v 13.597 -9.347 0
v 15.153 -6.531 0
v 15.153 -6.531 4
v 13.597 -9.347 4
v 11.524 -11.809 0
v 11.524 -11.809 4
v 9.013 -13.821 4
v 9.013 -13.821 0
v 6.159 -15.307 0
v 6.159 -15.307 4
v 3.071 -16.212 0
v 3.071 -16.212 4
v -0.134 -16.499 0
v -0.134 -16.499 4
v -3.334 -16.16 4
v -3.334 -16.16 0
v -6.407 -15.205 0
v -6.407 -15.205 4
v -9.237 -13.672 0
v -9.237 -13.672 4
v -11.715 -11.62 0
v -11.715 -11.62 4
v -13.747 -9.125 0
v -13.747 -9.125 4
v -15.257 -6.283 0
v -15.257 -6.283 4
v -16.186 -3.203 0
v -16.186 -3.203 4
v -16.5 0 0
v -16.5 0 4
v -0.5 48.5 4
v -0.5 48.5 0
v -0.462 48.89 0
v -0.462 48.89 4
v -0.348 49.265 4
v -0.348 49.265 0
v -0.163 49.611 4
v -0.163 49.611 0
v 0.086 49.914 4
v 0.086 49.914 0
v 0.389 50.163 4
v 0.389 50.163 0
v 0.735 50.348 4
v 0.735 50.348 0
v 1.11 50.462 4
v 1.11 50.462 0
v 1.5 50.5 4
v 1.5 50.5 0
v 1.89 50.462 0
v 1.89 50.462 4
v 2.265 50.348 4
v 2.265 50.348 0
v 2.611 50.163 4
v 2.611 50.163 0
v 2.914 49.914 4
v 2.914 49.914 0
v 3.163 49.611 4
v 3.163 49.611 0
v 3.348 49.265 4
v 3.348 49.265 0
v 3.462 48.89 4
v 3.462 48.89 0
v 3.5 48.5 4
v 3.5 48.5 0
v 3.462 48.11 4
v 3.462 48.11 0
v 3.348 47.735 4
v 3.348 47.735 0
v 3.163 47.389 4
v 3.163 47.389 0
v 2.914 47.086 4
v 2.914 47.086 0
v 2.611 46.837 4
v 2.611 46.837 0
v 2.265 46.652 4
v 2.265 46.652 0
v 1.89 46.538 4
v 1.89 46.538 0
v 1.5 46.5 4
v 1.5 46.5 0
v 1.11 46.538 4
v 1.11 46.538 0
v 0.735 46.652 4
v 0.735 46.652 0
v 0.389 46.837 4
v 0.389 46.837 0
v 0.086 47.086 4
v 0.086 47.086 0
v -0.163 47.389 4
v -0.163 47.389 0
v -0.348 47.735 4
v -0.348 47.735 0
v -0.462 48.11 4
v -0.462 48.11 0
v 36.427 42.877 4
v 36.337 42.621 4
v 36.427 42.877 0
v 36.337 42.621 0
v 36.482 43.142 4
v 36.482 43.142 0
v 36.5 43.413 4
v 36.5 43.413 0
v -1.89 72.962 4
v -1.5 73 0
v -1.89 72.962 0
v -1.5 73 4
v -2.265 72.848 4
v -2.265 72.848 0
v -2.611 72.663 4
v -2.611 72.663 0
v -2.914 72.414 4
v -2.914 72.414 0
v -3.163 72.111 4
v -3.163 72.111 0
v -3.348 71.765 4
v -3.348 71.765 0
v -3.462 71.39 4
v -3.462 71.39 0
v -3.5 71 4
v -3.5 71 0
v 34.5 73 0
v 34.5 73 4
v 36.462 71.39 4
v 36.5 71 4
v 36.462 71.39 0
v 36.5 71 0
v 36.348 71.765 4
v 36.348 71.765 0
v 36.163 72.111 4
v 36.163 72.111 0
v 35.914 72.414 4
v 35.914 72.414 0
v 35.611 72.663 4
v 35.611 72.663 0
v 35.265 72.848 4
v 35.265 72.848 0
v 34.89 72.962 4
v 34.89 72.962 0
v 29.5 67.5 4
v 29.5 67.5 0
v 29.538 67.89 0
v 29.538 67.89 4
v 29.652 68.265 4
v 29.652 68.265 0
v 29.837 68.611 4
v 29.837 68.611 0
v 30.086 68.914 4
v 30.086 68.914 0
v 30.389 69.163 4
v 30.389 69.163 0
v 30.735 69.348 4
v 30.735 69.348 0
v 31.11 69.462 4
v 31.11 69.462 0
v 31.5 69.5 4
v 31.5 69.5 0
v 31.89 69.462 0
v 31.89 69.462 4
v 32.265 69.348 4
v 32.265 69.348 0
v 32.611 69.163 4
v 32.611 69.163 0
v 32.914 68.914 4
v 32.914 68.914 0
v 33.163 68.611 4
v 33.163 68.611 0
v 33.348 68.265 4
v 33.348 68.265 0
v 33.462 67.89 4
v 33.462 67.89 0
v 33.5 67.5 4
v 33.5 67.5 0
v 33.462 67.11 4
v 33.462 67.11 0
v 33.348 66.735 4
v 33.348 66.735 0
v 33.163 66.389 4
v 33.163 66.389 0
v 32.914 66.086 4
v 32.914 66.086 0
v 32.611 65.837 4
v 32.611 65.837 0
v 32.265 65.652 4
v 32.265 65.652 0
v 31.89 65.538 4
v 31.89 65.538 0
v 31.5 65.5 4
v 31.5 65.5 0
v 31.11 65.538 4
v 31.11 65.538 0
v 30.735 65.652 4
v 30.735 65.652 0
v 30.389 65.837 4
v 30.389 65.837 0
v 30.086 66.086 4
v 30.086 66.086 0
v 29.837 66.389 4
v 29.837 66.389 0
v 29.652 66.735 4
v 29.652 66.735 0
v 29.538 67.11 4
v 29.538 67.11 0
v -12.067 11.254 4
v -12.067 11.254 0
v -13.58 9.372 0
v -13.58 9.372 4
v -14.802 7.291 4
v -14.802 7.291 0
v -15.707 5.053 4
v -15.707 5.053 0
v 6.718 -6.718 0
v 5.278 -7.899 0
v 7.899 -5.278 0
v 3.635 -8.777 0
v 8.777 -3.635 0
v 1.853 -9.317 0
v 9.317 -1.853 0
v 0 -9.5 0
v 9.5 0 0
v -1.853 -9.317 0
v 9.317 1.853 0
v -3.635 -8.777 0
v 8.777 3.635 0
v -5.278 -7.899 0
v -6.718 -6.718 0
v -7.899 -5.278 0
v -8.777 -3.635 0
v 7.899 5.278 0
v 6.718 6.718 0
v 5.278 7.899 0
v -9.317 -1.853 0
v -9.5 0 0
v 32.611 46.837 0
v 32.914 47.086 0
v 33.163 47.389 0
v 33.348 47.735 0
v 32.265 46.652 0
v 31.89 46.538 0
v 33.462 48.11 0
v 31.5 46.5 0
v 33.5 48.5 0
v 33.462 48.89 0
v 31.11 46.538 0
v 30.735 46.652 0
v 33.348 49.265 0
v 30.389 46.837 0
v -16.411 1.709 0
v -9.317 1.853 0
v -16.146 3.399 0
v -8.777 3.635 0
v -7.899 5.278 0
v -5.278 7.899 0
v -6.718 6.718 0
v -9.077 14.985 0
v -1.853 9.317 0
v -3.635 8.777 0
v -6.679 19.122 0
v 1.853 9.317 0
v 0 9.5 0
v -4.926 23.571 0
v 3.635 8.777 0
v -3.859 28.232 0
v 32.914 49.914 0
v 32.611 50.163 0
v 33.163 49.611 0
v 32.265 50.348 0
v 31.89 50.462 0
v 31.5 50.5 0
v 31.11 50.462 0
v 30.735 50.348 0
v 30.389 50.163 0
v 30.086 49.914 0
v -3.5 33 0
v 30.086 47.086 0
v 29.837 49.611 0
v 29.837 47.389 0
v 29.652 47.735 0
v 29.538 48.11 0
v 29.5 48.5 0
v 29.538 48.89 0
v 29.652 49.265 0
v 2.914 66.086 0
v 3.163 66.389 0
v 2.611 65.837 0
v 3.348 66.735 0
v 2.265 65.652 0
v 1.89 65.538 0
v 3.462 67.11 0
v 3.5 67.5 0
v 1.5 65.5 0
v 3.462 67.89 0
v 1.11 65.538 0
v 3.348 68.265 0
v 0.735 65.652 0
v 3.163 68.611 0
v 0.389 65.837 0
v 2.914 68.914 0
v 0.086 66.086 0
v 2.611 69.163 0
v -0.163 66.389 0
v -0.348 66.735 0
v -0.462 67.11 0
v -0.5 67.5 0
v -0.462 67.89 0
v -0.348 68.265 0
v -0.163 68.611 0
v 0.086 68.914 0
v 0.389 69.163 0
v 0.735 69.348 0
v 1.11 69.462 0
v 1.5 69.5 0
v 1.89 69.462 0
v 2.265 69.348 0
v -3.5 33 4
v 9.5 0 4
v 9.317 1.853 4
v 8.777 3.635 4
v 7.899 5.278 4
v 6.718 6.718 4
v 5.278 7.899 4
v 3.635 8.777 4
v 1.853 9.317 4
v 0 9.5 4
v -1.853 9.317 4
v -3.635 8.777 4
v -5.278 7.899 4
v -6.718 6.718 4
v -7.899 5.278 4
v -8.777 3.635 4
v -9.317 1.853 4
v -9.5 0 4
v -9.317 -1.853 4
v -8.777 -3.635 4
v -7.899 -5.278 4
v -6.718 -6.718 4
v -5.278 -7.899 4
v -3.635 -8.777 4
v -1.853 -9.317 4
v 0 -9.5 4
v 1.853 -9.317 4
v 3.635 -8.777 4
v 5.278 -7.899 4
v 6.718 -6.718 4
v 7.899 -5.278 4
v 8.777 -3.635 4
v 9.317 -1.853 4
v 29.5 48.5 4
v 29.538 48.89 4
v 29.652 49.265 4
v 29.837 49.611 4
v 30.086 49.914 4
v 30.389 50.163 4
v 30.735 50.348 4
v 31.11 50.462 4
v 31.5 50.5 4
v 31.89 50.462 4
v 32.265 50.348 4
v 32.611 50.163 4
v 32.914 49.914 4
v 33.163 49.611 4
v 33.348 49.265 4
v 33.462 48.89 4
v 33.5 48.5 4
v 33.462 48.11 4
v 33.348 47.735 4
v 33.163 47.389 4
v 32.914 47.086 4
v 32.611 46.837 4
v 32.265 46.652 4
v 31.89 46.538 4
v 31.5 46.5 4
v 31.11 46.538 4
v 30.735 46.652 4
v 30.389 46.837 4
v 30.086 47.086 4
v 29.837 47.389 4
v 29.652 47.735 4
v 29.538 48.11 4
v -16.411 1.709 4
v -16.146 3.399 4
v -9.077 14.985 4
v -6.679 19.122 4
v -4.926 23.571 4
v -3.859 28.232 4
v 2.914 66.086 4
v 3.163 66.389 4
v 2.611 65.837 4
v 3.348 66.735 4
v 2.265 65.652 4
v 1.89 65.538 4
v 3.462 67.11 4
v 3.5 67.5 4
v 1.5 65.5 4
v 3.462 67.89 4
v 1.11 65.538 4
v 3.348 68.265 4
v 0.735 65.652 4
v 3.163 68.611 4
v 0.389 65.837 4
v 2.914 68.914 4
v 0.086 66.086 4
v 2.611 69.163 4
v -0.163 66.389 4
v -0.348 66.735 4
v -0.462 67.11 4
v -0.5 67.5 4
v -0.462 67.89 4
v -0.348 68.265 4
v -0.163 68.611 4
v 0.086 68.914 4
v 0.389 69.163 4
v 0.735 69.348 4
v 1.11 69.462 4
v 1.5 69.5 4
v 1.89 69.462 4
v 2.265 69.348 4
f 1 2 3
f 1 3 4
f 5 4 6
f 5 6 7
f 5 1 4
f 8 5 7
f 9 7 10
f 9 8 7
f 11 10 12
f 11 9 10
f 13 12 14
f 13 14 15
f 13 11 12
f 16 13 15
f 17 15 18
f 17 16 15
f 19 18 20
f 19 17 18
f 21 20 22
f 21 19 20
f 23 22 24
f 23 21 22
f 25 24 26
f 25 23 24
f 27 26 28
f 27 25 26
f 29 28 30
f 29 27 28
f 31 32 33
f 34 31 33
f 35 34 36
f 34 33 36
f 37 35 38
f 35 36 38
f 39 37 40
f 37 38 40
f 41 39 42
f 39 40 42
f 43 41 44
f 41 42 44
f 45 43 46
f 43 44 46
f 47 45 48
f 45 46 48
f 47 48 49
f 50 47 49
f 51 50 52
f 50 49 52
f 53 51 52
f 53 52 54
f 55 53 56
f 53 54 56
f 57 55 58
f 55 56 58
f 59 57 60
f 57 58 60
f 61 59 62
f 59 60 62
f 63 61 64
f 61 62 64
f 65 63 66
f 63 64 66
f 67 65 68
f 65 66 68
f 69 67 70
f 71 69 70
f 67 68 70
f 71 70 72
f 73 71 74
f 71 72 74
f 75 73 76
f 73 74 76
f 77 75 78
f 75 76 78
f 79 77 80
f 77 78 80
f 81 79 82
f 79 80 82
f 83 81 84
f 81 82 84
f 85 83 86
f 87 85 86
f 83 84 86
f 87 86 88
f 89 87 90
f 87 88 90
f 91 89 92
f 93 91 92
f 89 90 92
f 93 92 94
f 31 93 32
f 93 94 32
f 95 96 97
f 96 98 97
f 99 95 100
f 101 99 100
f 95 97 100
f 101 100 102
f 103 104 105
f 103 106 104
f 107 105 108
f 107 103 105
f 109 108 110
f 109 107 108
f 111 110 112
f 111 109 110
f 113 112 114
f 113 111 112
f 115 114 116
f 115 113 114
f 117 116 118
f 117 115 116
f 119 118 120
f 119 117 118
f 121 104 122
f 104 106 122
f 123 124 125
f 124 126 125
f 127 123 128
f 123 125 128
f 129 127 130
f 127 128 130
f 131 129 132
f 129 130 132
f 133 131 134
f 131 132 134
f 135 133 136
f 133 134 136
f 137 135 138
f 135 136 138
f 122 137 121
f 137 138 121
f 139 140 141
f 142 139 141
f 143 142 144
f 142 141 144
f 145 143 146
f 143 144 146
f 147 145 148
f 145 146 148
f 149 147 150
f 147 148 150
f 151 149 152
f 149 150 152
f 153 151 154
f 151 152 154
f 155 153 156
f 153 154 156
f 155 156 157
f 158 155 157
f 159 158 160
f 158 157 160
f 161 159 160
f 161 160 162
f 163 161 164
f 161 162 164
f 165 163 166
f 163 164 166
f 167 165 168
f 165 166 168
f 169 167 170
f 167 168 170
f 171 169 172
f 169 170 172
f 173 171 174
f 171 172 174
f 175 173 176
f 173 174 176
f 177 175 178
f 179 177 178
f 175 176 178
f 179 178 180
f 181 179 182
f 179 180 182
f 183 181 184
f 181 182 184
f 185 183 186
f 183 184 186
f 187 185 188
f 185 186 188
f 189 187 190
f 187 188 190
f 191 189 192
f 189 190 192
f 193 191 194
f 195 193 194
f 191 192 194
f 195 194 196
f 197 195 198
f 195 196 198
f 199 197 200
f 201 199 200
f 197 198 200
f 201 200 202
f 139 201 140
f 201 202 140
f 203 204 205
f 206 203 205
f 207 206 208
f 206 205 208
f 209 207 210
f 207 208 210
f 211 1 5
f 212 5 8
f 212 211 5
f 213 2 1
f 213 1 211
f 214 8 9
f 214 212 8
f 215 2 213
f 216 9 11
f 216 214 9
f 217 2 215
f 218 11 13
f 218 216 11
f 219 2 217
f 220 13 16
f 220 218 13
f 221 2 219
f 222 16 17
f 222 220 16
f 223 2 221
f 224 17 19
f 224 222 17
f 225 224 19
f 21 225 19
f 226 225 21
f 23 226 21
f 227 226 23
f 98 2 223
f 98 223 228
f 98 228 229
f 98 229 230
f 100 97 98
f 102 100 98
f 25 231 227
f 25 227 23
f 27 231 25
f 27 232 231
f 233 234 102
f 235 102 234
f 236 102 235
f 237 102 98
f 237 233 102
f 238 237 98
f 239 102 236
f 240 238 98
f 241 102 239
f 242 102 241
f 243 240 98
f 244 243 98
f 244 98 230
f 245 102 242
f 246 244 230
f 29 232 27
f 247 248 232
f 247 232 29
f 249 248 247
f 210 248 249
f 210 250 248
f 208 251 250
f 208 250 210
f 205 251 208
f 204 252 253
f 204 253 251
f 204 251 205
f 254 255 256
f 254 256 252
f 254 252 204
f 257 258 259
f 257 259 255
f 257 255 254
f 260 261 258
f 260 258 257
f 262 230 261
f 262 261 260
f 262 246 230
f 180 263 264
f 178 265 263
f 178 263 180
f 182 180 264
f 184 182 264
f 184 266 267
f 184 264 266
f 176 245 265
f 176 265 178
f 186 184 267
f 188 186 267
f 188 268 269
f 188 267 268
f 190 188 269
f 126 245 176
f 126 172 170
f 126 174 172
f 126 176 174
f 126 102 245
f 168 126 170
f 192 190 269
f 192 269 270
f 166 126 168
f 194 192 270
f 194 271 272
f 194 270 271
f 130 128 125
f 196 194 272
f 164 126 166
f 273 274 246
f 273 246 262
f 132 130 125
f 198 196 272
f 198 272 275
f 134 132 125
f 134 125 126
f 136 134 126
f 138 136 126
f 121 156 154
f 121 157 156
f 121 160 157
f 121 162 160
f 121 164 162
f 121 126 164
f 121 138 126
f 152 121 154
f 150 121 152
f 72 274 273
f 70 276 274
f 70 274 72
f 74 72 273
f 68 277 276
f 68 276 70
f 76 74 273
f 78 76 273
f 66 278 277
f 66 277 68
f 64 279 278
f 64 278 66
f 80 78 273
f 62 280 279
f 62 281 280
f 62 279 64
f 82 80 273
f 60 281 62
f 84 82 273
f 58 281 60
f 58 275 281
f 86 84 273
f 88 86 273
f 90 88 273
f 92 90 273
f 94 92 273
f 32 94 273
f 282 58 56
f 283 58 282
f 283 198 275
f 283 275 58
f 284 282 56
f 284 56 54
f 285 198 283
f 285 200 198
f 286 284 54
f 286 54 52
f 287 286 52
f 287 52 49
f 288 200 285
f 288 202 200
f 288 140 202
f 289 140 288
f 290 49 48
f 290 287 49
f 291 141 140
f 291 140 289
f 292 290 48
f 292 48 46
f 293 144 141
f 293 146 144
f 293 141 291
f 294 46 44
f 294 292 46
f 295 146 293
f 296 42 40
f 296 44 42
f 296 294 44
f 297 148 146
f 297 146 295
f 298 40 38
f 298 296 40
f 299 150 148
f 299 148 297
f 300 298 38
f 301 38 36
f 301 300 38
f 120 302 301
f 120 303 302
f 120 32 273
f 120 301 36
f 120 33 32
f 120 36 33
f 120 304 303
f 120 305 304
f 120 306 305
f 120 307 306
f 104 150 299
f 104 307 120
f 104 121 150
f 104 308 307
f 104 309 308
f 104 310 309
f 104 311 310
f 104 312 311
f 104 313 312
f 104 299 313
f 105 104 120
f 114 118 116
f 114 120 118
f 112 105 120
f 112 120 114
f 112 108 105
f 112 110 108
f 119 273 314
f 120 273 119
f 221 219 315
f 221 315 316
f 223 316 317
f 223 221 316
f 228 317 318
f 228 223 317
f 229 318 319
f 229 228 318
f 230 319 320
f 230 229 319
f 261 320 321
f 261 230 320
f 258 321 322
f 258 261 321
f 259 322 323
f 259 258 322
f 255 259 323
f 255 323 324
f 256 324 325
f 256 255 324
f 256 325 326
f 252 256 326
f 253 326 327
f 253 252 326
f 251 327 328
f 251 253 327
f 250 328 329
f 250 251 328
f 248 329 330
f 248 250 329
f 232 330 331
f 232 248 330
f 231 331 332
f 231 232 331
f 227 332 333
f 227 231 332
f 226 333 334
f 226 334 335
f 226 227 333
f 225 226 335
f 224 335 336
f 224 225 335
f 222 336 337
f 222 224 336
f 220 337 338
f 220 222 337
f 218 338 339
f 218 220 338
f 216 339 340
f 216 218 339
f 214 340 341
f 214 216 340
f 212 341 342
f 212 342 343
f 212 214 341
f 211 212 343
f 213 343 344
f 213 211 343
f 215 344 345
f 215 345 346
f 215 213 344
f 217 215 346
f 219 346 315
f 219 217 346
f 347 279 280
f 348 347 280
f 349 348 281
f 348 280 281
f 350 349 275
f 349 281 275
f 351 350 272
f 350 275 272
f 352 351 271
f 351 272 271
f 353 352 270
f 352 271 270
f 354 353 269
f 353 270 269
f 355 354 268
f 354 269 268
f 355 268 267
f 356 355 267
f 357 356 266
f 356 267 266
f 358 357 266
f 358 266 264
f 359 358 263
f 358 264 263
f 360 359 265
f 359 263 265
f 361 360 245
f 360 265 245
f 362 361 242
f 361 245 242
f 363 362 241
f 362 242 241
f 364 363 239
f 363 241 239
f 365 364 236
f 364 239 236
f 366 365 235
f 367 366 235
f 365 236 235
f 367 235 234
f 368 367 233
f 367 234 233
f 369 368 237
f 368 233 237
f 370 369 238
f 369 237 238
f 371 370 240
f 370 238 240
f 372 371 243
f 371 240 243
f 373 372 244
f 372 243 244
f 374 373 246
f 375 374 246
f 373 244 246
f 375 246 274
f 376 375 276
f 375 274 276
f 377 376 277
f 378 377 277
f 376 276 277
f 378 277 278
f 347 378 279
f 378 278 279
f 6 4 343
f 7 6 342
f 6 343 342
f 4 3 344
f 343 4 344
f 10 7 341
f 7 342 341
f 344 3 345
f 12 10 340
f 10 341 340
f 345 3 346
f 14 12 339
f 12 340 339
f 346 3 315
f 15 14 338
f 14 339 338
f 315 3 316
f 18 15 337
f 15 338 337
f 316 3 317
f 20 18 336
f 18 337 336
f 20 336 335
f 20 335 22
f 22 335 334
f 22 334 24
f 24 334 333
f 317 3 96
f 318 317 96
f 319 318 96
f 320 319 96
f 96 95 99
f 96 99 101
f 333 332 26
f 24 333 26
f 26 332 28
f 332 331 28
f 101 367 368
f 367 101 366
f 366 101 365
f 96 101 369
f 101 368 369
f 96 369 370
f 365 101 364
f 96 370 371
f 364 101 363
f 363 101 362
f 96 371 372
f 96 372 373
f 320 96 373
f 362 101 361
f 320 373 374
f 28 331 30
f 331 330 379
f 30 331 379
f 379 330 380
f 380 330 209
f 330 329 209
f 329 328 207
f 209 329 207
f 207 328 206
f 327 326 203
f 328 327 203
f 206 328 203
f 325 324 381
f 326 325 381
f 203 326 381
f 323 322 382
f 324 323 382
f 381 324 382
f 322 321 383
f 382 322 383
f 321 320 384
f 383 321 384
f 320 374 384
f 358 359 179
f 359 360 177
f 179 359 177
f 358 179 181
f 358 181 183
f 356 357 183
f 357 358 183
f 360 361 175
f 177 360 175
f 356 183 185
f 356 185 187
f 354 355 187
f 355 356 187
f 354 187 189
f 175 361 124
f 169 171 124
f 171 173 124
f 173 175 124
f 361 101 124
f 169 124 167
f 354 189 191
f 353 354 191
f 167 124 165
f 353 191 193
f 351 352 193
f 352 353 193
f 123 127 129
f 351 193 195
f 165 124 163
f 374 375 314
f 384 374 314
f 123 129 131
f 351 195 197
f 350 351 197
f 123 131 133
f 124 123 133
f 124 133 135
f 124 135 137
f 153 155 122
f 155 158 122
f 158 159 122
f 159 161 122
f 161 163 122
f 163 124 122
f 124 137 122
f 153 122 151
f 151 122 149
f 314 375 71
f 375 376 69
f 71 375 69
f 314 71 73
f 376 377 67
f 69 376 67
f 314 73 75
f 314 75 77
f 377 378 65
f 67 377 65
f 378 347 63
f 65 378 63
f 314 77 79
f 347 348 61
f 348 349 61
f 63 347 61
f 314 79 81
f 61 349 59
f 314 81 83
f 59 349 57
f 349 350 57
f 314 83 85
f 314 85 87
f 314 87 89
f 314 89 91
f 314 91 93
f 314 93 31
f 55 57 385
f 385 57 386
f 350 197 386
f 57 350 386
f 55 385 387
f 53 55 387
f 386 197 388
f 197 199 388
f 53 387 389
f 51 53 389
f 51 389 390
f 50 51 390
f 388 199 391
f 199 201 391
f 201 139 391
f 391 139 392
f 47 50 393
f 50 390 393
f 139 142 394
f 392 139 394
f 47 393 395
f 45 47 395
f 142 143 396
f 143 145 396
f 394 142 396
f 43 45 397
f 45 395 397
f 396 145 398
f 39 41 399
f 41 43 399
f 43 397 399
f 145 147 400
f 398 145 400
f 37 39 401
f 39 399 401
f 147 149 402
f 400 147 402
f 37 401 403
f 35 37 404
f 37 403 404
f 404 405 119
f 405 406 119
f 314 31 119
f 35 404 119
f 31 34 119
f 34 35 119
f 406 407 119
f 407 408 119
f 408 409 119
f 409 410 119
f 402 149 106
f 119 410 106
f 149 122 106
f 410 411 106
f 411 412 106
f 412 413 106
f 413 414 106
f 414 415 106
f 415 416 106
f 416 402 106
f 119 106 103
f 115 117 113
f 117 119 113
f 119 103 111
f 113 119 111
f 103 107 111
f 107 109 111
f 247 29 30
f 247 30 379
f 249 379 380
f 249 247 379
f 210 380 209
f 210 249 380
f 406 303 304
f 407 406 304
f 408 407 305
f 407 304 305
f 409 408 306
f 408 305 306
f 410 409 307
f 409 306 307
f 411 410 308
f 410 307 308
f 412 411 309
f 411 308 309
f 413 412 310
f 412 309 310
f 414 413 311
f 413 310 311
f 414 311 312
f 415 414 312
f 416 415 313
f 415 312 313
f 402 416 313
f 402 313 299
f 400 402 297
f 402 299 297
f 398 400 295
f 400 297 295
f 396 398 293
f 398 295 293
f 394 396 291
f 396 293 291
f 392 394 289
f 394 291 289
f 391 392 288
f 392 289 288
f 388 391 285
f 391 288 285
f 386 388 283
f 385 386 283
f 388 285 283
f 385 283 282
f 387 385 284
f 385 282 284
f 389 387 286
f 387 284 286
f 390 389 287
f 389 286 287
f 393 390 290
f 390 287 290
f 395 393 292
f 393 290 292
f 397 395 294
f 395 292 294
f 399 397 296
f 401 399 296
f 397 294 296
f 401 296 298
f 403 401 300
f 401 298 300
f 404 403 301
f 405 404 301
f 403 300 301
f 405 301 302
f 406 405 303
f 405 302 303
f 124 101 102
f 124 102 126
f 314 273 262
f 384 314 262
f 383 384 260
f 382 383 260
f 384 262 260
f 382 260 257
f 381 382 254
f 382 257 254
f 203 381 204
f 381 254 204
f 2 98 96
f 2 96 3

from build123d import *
from build123d.topology import SkipClean

# Parameters (mm, degrees)
SKETCH_1_R          = 9.5
EXTRUDE_1_DEPTH     = 4
SKETCH_2_W          = 20
SKETCH_2_H          = 30
EXTRUDE_2_DEPTH     = 4
CUT_EXTRUDE_START   = -4
CUT_EXTRUDE_1_DEPTH = 4
EXTRUDE_3_DEPTH     = 4
CUT_EXTRUDE_2_DEPTH = 4
SKETCH_6_R          = 2
CUT_EXTRUDE_3_DEPTH = 4
FILLET_1_R          = 2


with BuildPart() as part:
    # 草图1 → 凸台-拉伸1 (new body)
    with BuildSketch(Plane.XY):
        with BuildLine():
            Line((-16.5, 0), (-16.5, 73))
            Line((-16.5, 73), (16.5, 73))
            Line((16.5, 73), (16.5, 0))
            ThreePointArc((16.5, 0), (0, -16.5), (-16.5, 0))
        make_face()
        Circle(SKETCH_1_R, mode=Mode.SUBTRACT)
    extrude(amount=EXTRUDE_1_DEPTH)

    # 草图2 → 凸台-拉伸2 (add)
    with BuildSketch(Plane.XY.offset(4)):
        with Locations((26.5, 58)):
            Rectangle(SKETCH_2_W, SKETCH_2_H)
    extrude(amount=-EXTRUDE_2_DEPTH)

    # 草图3 → 切除-拉伸1 (cut)
    with BuildSketch(Plane.XY.offset(4).offset(CUT_EXTRUDE_START)):
        with BuildLine():
            Line((-15.707266889, 5.052896881), (-3.5, 43))
            Line((-3.5, 43), (-3.5, 73))
            Line((-3.5, 73), (-16.5, 73))
            Line((-16.5, 73), (-16.5, 0))
            ThreePointArc((-16.5, 0), (-16.300612008, 2.557351788), (-15.707266889, 5.052896881))
        make_face()
    extrude(amount=CUT_EXTRUDE_1_DEPTH, mode=Mode.SUBTRACT)

    # 草图4 → 凸台-拉伸3 (add)
    with BuildSketch(Plane(origin=(0, 0, 0), x_dir=(-1, 0, 0), z_dir=(0, 0, -1))):
        Polygon((-36.5, 43), (-15.152569354, -6.530669335), (-9.5, 0), (-16.5, 43), align=None)
    extrude(amount=-EXTRUDE_3_DEPTH)

    # 草图5 → 切除-拉伸2 (cut)
    with SkipClean():  # the faces are left unmerged after this step: merging them gives an invalid solid
        with BuildSketch(Plane.XY.offset(4).offset(CUT_EXTRUDE_START)):
            with BuildLine():
                Line((-3.5, 43), (-3.5, 33))
                ThreePointArc((-3.5, 33), (-5.718901629, 21.313506702), (-12.066772655, 11.253577107))
                ThreePointArc((-12.066772655, 11.253577107), (-14.228894088, 8.353955533), (-15.707266889, 5.052896881))
                Line((-15.707266889, 5.052896881), (-3.5, 43))
            make_face()
        extrude(amount=CUT_EXTRUDE_2_DEPTH, mode=Mode.SUBTRACT)

    # 草图6 → 切除-拉伸3 (cut)
    with SkipClean():  # the faces are left unmerged after this step: merging them gives an invalid solid
        with BuildSketch(Plane(origin=(0, 0, 0), x_dir=(-1, 0, 0), z_dir=(0, 0, -1))):
            with Locations((-31.5, 67.5)):
                Circle(SKETCH_6_R)
            with Locations((-1.5, 67.5)):
                Circle(SKETCH_6_R)
            with Locations((-31.5, 48.5)):
                Circle(SKETCH_6_R)
            with Locations((-1.5, 48.5)):
                Circle(SKETCH_6_R)
        extrude(amount=-CUT_EXTRUDE_3_DEPTH, mode=Mode.SUBTRACT)

    # 圆角1
    fillet_1_edges = [part.edges().sort_by_distance(p)[0] for p in [
        (36.5, 73, 2),
        (36.5, 43, 2),
        (-3.5, 73, 2),
    ]]
    fillet(fillet_1_edges, radius=FILLET_1_R)


solid = part.part
